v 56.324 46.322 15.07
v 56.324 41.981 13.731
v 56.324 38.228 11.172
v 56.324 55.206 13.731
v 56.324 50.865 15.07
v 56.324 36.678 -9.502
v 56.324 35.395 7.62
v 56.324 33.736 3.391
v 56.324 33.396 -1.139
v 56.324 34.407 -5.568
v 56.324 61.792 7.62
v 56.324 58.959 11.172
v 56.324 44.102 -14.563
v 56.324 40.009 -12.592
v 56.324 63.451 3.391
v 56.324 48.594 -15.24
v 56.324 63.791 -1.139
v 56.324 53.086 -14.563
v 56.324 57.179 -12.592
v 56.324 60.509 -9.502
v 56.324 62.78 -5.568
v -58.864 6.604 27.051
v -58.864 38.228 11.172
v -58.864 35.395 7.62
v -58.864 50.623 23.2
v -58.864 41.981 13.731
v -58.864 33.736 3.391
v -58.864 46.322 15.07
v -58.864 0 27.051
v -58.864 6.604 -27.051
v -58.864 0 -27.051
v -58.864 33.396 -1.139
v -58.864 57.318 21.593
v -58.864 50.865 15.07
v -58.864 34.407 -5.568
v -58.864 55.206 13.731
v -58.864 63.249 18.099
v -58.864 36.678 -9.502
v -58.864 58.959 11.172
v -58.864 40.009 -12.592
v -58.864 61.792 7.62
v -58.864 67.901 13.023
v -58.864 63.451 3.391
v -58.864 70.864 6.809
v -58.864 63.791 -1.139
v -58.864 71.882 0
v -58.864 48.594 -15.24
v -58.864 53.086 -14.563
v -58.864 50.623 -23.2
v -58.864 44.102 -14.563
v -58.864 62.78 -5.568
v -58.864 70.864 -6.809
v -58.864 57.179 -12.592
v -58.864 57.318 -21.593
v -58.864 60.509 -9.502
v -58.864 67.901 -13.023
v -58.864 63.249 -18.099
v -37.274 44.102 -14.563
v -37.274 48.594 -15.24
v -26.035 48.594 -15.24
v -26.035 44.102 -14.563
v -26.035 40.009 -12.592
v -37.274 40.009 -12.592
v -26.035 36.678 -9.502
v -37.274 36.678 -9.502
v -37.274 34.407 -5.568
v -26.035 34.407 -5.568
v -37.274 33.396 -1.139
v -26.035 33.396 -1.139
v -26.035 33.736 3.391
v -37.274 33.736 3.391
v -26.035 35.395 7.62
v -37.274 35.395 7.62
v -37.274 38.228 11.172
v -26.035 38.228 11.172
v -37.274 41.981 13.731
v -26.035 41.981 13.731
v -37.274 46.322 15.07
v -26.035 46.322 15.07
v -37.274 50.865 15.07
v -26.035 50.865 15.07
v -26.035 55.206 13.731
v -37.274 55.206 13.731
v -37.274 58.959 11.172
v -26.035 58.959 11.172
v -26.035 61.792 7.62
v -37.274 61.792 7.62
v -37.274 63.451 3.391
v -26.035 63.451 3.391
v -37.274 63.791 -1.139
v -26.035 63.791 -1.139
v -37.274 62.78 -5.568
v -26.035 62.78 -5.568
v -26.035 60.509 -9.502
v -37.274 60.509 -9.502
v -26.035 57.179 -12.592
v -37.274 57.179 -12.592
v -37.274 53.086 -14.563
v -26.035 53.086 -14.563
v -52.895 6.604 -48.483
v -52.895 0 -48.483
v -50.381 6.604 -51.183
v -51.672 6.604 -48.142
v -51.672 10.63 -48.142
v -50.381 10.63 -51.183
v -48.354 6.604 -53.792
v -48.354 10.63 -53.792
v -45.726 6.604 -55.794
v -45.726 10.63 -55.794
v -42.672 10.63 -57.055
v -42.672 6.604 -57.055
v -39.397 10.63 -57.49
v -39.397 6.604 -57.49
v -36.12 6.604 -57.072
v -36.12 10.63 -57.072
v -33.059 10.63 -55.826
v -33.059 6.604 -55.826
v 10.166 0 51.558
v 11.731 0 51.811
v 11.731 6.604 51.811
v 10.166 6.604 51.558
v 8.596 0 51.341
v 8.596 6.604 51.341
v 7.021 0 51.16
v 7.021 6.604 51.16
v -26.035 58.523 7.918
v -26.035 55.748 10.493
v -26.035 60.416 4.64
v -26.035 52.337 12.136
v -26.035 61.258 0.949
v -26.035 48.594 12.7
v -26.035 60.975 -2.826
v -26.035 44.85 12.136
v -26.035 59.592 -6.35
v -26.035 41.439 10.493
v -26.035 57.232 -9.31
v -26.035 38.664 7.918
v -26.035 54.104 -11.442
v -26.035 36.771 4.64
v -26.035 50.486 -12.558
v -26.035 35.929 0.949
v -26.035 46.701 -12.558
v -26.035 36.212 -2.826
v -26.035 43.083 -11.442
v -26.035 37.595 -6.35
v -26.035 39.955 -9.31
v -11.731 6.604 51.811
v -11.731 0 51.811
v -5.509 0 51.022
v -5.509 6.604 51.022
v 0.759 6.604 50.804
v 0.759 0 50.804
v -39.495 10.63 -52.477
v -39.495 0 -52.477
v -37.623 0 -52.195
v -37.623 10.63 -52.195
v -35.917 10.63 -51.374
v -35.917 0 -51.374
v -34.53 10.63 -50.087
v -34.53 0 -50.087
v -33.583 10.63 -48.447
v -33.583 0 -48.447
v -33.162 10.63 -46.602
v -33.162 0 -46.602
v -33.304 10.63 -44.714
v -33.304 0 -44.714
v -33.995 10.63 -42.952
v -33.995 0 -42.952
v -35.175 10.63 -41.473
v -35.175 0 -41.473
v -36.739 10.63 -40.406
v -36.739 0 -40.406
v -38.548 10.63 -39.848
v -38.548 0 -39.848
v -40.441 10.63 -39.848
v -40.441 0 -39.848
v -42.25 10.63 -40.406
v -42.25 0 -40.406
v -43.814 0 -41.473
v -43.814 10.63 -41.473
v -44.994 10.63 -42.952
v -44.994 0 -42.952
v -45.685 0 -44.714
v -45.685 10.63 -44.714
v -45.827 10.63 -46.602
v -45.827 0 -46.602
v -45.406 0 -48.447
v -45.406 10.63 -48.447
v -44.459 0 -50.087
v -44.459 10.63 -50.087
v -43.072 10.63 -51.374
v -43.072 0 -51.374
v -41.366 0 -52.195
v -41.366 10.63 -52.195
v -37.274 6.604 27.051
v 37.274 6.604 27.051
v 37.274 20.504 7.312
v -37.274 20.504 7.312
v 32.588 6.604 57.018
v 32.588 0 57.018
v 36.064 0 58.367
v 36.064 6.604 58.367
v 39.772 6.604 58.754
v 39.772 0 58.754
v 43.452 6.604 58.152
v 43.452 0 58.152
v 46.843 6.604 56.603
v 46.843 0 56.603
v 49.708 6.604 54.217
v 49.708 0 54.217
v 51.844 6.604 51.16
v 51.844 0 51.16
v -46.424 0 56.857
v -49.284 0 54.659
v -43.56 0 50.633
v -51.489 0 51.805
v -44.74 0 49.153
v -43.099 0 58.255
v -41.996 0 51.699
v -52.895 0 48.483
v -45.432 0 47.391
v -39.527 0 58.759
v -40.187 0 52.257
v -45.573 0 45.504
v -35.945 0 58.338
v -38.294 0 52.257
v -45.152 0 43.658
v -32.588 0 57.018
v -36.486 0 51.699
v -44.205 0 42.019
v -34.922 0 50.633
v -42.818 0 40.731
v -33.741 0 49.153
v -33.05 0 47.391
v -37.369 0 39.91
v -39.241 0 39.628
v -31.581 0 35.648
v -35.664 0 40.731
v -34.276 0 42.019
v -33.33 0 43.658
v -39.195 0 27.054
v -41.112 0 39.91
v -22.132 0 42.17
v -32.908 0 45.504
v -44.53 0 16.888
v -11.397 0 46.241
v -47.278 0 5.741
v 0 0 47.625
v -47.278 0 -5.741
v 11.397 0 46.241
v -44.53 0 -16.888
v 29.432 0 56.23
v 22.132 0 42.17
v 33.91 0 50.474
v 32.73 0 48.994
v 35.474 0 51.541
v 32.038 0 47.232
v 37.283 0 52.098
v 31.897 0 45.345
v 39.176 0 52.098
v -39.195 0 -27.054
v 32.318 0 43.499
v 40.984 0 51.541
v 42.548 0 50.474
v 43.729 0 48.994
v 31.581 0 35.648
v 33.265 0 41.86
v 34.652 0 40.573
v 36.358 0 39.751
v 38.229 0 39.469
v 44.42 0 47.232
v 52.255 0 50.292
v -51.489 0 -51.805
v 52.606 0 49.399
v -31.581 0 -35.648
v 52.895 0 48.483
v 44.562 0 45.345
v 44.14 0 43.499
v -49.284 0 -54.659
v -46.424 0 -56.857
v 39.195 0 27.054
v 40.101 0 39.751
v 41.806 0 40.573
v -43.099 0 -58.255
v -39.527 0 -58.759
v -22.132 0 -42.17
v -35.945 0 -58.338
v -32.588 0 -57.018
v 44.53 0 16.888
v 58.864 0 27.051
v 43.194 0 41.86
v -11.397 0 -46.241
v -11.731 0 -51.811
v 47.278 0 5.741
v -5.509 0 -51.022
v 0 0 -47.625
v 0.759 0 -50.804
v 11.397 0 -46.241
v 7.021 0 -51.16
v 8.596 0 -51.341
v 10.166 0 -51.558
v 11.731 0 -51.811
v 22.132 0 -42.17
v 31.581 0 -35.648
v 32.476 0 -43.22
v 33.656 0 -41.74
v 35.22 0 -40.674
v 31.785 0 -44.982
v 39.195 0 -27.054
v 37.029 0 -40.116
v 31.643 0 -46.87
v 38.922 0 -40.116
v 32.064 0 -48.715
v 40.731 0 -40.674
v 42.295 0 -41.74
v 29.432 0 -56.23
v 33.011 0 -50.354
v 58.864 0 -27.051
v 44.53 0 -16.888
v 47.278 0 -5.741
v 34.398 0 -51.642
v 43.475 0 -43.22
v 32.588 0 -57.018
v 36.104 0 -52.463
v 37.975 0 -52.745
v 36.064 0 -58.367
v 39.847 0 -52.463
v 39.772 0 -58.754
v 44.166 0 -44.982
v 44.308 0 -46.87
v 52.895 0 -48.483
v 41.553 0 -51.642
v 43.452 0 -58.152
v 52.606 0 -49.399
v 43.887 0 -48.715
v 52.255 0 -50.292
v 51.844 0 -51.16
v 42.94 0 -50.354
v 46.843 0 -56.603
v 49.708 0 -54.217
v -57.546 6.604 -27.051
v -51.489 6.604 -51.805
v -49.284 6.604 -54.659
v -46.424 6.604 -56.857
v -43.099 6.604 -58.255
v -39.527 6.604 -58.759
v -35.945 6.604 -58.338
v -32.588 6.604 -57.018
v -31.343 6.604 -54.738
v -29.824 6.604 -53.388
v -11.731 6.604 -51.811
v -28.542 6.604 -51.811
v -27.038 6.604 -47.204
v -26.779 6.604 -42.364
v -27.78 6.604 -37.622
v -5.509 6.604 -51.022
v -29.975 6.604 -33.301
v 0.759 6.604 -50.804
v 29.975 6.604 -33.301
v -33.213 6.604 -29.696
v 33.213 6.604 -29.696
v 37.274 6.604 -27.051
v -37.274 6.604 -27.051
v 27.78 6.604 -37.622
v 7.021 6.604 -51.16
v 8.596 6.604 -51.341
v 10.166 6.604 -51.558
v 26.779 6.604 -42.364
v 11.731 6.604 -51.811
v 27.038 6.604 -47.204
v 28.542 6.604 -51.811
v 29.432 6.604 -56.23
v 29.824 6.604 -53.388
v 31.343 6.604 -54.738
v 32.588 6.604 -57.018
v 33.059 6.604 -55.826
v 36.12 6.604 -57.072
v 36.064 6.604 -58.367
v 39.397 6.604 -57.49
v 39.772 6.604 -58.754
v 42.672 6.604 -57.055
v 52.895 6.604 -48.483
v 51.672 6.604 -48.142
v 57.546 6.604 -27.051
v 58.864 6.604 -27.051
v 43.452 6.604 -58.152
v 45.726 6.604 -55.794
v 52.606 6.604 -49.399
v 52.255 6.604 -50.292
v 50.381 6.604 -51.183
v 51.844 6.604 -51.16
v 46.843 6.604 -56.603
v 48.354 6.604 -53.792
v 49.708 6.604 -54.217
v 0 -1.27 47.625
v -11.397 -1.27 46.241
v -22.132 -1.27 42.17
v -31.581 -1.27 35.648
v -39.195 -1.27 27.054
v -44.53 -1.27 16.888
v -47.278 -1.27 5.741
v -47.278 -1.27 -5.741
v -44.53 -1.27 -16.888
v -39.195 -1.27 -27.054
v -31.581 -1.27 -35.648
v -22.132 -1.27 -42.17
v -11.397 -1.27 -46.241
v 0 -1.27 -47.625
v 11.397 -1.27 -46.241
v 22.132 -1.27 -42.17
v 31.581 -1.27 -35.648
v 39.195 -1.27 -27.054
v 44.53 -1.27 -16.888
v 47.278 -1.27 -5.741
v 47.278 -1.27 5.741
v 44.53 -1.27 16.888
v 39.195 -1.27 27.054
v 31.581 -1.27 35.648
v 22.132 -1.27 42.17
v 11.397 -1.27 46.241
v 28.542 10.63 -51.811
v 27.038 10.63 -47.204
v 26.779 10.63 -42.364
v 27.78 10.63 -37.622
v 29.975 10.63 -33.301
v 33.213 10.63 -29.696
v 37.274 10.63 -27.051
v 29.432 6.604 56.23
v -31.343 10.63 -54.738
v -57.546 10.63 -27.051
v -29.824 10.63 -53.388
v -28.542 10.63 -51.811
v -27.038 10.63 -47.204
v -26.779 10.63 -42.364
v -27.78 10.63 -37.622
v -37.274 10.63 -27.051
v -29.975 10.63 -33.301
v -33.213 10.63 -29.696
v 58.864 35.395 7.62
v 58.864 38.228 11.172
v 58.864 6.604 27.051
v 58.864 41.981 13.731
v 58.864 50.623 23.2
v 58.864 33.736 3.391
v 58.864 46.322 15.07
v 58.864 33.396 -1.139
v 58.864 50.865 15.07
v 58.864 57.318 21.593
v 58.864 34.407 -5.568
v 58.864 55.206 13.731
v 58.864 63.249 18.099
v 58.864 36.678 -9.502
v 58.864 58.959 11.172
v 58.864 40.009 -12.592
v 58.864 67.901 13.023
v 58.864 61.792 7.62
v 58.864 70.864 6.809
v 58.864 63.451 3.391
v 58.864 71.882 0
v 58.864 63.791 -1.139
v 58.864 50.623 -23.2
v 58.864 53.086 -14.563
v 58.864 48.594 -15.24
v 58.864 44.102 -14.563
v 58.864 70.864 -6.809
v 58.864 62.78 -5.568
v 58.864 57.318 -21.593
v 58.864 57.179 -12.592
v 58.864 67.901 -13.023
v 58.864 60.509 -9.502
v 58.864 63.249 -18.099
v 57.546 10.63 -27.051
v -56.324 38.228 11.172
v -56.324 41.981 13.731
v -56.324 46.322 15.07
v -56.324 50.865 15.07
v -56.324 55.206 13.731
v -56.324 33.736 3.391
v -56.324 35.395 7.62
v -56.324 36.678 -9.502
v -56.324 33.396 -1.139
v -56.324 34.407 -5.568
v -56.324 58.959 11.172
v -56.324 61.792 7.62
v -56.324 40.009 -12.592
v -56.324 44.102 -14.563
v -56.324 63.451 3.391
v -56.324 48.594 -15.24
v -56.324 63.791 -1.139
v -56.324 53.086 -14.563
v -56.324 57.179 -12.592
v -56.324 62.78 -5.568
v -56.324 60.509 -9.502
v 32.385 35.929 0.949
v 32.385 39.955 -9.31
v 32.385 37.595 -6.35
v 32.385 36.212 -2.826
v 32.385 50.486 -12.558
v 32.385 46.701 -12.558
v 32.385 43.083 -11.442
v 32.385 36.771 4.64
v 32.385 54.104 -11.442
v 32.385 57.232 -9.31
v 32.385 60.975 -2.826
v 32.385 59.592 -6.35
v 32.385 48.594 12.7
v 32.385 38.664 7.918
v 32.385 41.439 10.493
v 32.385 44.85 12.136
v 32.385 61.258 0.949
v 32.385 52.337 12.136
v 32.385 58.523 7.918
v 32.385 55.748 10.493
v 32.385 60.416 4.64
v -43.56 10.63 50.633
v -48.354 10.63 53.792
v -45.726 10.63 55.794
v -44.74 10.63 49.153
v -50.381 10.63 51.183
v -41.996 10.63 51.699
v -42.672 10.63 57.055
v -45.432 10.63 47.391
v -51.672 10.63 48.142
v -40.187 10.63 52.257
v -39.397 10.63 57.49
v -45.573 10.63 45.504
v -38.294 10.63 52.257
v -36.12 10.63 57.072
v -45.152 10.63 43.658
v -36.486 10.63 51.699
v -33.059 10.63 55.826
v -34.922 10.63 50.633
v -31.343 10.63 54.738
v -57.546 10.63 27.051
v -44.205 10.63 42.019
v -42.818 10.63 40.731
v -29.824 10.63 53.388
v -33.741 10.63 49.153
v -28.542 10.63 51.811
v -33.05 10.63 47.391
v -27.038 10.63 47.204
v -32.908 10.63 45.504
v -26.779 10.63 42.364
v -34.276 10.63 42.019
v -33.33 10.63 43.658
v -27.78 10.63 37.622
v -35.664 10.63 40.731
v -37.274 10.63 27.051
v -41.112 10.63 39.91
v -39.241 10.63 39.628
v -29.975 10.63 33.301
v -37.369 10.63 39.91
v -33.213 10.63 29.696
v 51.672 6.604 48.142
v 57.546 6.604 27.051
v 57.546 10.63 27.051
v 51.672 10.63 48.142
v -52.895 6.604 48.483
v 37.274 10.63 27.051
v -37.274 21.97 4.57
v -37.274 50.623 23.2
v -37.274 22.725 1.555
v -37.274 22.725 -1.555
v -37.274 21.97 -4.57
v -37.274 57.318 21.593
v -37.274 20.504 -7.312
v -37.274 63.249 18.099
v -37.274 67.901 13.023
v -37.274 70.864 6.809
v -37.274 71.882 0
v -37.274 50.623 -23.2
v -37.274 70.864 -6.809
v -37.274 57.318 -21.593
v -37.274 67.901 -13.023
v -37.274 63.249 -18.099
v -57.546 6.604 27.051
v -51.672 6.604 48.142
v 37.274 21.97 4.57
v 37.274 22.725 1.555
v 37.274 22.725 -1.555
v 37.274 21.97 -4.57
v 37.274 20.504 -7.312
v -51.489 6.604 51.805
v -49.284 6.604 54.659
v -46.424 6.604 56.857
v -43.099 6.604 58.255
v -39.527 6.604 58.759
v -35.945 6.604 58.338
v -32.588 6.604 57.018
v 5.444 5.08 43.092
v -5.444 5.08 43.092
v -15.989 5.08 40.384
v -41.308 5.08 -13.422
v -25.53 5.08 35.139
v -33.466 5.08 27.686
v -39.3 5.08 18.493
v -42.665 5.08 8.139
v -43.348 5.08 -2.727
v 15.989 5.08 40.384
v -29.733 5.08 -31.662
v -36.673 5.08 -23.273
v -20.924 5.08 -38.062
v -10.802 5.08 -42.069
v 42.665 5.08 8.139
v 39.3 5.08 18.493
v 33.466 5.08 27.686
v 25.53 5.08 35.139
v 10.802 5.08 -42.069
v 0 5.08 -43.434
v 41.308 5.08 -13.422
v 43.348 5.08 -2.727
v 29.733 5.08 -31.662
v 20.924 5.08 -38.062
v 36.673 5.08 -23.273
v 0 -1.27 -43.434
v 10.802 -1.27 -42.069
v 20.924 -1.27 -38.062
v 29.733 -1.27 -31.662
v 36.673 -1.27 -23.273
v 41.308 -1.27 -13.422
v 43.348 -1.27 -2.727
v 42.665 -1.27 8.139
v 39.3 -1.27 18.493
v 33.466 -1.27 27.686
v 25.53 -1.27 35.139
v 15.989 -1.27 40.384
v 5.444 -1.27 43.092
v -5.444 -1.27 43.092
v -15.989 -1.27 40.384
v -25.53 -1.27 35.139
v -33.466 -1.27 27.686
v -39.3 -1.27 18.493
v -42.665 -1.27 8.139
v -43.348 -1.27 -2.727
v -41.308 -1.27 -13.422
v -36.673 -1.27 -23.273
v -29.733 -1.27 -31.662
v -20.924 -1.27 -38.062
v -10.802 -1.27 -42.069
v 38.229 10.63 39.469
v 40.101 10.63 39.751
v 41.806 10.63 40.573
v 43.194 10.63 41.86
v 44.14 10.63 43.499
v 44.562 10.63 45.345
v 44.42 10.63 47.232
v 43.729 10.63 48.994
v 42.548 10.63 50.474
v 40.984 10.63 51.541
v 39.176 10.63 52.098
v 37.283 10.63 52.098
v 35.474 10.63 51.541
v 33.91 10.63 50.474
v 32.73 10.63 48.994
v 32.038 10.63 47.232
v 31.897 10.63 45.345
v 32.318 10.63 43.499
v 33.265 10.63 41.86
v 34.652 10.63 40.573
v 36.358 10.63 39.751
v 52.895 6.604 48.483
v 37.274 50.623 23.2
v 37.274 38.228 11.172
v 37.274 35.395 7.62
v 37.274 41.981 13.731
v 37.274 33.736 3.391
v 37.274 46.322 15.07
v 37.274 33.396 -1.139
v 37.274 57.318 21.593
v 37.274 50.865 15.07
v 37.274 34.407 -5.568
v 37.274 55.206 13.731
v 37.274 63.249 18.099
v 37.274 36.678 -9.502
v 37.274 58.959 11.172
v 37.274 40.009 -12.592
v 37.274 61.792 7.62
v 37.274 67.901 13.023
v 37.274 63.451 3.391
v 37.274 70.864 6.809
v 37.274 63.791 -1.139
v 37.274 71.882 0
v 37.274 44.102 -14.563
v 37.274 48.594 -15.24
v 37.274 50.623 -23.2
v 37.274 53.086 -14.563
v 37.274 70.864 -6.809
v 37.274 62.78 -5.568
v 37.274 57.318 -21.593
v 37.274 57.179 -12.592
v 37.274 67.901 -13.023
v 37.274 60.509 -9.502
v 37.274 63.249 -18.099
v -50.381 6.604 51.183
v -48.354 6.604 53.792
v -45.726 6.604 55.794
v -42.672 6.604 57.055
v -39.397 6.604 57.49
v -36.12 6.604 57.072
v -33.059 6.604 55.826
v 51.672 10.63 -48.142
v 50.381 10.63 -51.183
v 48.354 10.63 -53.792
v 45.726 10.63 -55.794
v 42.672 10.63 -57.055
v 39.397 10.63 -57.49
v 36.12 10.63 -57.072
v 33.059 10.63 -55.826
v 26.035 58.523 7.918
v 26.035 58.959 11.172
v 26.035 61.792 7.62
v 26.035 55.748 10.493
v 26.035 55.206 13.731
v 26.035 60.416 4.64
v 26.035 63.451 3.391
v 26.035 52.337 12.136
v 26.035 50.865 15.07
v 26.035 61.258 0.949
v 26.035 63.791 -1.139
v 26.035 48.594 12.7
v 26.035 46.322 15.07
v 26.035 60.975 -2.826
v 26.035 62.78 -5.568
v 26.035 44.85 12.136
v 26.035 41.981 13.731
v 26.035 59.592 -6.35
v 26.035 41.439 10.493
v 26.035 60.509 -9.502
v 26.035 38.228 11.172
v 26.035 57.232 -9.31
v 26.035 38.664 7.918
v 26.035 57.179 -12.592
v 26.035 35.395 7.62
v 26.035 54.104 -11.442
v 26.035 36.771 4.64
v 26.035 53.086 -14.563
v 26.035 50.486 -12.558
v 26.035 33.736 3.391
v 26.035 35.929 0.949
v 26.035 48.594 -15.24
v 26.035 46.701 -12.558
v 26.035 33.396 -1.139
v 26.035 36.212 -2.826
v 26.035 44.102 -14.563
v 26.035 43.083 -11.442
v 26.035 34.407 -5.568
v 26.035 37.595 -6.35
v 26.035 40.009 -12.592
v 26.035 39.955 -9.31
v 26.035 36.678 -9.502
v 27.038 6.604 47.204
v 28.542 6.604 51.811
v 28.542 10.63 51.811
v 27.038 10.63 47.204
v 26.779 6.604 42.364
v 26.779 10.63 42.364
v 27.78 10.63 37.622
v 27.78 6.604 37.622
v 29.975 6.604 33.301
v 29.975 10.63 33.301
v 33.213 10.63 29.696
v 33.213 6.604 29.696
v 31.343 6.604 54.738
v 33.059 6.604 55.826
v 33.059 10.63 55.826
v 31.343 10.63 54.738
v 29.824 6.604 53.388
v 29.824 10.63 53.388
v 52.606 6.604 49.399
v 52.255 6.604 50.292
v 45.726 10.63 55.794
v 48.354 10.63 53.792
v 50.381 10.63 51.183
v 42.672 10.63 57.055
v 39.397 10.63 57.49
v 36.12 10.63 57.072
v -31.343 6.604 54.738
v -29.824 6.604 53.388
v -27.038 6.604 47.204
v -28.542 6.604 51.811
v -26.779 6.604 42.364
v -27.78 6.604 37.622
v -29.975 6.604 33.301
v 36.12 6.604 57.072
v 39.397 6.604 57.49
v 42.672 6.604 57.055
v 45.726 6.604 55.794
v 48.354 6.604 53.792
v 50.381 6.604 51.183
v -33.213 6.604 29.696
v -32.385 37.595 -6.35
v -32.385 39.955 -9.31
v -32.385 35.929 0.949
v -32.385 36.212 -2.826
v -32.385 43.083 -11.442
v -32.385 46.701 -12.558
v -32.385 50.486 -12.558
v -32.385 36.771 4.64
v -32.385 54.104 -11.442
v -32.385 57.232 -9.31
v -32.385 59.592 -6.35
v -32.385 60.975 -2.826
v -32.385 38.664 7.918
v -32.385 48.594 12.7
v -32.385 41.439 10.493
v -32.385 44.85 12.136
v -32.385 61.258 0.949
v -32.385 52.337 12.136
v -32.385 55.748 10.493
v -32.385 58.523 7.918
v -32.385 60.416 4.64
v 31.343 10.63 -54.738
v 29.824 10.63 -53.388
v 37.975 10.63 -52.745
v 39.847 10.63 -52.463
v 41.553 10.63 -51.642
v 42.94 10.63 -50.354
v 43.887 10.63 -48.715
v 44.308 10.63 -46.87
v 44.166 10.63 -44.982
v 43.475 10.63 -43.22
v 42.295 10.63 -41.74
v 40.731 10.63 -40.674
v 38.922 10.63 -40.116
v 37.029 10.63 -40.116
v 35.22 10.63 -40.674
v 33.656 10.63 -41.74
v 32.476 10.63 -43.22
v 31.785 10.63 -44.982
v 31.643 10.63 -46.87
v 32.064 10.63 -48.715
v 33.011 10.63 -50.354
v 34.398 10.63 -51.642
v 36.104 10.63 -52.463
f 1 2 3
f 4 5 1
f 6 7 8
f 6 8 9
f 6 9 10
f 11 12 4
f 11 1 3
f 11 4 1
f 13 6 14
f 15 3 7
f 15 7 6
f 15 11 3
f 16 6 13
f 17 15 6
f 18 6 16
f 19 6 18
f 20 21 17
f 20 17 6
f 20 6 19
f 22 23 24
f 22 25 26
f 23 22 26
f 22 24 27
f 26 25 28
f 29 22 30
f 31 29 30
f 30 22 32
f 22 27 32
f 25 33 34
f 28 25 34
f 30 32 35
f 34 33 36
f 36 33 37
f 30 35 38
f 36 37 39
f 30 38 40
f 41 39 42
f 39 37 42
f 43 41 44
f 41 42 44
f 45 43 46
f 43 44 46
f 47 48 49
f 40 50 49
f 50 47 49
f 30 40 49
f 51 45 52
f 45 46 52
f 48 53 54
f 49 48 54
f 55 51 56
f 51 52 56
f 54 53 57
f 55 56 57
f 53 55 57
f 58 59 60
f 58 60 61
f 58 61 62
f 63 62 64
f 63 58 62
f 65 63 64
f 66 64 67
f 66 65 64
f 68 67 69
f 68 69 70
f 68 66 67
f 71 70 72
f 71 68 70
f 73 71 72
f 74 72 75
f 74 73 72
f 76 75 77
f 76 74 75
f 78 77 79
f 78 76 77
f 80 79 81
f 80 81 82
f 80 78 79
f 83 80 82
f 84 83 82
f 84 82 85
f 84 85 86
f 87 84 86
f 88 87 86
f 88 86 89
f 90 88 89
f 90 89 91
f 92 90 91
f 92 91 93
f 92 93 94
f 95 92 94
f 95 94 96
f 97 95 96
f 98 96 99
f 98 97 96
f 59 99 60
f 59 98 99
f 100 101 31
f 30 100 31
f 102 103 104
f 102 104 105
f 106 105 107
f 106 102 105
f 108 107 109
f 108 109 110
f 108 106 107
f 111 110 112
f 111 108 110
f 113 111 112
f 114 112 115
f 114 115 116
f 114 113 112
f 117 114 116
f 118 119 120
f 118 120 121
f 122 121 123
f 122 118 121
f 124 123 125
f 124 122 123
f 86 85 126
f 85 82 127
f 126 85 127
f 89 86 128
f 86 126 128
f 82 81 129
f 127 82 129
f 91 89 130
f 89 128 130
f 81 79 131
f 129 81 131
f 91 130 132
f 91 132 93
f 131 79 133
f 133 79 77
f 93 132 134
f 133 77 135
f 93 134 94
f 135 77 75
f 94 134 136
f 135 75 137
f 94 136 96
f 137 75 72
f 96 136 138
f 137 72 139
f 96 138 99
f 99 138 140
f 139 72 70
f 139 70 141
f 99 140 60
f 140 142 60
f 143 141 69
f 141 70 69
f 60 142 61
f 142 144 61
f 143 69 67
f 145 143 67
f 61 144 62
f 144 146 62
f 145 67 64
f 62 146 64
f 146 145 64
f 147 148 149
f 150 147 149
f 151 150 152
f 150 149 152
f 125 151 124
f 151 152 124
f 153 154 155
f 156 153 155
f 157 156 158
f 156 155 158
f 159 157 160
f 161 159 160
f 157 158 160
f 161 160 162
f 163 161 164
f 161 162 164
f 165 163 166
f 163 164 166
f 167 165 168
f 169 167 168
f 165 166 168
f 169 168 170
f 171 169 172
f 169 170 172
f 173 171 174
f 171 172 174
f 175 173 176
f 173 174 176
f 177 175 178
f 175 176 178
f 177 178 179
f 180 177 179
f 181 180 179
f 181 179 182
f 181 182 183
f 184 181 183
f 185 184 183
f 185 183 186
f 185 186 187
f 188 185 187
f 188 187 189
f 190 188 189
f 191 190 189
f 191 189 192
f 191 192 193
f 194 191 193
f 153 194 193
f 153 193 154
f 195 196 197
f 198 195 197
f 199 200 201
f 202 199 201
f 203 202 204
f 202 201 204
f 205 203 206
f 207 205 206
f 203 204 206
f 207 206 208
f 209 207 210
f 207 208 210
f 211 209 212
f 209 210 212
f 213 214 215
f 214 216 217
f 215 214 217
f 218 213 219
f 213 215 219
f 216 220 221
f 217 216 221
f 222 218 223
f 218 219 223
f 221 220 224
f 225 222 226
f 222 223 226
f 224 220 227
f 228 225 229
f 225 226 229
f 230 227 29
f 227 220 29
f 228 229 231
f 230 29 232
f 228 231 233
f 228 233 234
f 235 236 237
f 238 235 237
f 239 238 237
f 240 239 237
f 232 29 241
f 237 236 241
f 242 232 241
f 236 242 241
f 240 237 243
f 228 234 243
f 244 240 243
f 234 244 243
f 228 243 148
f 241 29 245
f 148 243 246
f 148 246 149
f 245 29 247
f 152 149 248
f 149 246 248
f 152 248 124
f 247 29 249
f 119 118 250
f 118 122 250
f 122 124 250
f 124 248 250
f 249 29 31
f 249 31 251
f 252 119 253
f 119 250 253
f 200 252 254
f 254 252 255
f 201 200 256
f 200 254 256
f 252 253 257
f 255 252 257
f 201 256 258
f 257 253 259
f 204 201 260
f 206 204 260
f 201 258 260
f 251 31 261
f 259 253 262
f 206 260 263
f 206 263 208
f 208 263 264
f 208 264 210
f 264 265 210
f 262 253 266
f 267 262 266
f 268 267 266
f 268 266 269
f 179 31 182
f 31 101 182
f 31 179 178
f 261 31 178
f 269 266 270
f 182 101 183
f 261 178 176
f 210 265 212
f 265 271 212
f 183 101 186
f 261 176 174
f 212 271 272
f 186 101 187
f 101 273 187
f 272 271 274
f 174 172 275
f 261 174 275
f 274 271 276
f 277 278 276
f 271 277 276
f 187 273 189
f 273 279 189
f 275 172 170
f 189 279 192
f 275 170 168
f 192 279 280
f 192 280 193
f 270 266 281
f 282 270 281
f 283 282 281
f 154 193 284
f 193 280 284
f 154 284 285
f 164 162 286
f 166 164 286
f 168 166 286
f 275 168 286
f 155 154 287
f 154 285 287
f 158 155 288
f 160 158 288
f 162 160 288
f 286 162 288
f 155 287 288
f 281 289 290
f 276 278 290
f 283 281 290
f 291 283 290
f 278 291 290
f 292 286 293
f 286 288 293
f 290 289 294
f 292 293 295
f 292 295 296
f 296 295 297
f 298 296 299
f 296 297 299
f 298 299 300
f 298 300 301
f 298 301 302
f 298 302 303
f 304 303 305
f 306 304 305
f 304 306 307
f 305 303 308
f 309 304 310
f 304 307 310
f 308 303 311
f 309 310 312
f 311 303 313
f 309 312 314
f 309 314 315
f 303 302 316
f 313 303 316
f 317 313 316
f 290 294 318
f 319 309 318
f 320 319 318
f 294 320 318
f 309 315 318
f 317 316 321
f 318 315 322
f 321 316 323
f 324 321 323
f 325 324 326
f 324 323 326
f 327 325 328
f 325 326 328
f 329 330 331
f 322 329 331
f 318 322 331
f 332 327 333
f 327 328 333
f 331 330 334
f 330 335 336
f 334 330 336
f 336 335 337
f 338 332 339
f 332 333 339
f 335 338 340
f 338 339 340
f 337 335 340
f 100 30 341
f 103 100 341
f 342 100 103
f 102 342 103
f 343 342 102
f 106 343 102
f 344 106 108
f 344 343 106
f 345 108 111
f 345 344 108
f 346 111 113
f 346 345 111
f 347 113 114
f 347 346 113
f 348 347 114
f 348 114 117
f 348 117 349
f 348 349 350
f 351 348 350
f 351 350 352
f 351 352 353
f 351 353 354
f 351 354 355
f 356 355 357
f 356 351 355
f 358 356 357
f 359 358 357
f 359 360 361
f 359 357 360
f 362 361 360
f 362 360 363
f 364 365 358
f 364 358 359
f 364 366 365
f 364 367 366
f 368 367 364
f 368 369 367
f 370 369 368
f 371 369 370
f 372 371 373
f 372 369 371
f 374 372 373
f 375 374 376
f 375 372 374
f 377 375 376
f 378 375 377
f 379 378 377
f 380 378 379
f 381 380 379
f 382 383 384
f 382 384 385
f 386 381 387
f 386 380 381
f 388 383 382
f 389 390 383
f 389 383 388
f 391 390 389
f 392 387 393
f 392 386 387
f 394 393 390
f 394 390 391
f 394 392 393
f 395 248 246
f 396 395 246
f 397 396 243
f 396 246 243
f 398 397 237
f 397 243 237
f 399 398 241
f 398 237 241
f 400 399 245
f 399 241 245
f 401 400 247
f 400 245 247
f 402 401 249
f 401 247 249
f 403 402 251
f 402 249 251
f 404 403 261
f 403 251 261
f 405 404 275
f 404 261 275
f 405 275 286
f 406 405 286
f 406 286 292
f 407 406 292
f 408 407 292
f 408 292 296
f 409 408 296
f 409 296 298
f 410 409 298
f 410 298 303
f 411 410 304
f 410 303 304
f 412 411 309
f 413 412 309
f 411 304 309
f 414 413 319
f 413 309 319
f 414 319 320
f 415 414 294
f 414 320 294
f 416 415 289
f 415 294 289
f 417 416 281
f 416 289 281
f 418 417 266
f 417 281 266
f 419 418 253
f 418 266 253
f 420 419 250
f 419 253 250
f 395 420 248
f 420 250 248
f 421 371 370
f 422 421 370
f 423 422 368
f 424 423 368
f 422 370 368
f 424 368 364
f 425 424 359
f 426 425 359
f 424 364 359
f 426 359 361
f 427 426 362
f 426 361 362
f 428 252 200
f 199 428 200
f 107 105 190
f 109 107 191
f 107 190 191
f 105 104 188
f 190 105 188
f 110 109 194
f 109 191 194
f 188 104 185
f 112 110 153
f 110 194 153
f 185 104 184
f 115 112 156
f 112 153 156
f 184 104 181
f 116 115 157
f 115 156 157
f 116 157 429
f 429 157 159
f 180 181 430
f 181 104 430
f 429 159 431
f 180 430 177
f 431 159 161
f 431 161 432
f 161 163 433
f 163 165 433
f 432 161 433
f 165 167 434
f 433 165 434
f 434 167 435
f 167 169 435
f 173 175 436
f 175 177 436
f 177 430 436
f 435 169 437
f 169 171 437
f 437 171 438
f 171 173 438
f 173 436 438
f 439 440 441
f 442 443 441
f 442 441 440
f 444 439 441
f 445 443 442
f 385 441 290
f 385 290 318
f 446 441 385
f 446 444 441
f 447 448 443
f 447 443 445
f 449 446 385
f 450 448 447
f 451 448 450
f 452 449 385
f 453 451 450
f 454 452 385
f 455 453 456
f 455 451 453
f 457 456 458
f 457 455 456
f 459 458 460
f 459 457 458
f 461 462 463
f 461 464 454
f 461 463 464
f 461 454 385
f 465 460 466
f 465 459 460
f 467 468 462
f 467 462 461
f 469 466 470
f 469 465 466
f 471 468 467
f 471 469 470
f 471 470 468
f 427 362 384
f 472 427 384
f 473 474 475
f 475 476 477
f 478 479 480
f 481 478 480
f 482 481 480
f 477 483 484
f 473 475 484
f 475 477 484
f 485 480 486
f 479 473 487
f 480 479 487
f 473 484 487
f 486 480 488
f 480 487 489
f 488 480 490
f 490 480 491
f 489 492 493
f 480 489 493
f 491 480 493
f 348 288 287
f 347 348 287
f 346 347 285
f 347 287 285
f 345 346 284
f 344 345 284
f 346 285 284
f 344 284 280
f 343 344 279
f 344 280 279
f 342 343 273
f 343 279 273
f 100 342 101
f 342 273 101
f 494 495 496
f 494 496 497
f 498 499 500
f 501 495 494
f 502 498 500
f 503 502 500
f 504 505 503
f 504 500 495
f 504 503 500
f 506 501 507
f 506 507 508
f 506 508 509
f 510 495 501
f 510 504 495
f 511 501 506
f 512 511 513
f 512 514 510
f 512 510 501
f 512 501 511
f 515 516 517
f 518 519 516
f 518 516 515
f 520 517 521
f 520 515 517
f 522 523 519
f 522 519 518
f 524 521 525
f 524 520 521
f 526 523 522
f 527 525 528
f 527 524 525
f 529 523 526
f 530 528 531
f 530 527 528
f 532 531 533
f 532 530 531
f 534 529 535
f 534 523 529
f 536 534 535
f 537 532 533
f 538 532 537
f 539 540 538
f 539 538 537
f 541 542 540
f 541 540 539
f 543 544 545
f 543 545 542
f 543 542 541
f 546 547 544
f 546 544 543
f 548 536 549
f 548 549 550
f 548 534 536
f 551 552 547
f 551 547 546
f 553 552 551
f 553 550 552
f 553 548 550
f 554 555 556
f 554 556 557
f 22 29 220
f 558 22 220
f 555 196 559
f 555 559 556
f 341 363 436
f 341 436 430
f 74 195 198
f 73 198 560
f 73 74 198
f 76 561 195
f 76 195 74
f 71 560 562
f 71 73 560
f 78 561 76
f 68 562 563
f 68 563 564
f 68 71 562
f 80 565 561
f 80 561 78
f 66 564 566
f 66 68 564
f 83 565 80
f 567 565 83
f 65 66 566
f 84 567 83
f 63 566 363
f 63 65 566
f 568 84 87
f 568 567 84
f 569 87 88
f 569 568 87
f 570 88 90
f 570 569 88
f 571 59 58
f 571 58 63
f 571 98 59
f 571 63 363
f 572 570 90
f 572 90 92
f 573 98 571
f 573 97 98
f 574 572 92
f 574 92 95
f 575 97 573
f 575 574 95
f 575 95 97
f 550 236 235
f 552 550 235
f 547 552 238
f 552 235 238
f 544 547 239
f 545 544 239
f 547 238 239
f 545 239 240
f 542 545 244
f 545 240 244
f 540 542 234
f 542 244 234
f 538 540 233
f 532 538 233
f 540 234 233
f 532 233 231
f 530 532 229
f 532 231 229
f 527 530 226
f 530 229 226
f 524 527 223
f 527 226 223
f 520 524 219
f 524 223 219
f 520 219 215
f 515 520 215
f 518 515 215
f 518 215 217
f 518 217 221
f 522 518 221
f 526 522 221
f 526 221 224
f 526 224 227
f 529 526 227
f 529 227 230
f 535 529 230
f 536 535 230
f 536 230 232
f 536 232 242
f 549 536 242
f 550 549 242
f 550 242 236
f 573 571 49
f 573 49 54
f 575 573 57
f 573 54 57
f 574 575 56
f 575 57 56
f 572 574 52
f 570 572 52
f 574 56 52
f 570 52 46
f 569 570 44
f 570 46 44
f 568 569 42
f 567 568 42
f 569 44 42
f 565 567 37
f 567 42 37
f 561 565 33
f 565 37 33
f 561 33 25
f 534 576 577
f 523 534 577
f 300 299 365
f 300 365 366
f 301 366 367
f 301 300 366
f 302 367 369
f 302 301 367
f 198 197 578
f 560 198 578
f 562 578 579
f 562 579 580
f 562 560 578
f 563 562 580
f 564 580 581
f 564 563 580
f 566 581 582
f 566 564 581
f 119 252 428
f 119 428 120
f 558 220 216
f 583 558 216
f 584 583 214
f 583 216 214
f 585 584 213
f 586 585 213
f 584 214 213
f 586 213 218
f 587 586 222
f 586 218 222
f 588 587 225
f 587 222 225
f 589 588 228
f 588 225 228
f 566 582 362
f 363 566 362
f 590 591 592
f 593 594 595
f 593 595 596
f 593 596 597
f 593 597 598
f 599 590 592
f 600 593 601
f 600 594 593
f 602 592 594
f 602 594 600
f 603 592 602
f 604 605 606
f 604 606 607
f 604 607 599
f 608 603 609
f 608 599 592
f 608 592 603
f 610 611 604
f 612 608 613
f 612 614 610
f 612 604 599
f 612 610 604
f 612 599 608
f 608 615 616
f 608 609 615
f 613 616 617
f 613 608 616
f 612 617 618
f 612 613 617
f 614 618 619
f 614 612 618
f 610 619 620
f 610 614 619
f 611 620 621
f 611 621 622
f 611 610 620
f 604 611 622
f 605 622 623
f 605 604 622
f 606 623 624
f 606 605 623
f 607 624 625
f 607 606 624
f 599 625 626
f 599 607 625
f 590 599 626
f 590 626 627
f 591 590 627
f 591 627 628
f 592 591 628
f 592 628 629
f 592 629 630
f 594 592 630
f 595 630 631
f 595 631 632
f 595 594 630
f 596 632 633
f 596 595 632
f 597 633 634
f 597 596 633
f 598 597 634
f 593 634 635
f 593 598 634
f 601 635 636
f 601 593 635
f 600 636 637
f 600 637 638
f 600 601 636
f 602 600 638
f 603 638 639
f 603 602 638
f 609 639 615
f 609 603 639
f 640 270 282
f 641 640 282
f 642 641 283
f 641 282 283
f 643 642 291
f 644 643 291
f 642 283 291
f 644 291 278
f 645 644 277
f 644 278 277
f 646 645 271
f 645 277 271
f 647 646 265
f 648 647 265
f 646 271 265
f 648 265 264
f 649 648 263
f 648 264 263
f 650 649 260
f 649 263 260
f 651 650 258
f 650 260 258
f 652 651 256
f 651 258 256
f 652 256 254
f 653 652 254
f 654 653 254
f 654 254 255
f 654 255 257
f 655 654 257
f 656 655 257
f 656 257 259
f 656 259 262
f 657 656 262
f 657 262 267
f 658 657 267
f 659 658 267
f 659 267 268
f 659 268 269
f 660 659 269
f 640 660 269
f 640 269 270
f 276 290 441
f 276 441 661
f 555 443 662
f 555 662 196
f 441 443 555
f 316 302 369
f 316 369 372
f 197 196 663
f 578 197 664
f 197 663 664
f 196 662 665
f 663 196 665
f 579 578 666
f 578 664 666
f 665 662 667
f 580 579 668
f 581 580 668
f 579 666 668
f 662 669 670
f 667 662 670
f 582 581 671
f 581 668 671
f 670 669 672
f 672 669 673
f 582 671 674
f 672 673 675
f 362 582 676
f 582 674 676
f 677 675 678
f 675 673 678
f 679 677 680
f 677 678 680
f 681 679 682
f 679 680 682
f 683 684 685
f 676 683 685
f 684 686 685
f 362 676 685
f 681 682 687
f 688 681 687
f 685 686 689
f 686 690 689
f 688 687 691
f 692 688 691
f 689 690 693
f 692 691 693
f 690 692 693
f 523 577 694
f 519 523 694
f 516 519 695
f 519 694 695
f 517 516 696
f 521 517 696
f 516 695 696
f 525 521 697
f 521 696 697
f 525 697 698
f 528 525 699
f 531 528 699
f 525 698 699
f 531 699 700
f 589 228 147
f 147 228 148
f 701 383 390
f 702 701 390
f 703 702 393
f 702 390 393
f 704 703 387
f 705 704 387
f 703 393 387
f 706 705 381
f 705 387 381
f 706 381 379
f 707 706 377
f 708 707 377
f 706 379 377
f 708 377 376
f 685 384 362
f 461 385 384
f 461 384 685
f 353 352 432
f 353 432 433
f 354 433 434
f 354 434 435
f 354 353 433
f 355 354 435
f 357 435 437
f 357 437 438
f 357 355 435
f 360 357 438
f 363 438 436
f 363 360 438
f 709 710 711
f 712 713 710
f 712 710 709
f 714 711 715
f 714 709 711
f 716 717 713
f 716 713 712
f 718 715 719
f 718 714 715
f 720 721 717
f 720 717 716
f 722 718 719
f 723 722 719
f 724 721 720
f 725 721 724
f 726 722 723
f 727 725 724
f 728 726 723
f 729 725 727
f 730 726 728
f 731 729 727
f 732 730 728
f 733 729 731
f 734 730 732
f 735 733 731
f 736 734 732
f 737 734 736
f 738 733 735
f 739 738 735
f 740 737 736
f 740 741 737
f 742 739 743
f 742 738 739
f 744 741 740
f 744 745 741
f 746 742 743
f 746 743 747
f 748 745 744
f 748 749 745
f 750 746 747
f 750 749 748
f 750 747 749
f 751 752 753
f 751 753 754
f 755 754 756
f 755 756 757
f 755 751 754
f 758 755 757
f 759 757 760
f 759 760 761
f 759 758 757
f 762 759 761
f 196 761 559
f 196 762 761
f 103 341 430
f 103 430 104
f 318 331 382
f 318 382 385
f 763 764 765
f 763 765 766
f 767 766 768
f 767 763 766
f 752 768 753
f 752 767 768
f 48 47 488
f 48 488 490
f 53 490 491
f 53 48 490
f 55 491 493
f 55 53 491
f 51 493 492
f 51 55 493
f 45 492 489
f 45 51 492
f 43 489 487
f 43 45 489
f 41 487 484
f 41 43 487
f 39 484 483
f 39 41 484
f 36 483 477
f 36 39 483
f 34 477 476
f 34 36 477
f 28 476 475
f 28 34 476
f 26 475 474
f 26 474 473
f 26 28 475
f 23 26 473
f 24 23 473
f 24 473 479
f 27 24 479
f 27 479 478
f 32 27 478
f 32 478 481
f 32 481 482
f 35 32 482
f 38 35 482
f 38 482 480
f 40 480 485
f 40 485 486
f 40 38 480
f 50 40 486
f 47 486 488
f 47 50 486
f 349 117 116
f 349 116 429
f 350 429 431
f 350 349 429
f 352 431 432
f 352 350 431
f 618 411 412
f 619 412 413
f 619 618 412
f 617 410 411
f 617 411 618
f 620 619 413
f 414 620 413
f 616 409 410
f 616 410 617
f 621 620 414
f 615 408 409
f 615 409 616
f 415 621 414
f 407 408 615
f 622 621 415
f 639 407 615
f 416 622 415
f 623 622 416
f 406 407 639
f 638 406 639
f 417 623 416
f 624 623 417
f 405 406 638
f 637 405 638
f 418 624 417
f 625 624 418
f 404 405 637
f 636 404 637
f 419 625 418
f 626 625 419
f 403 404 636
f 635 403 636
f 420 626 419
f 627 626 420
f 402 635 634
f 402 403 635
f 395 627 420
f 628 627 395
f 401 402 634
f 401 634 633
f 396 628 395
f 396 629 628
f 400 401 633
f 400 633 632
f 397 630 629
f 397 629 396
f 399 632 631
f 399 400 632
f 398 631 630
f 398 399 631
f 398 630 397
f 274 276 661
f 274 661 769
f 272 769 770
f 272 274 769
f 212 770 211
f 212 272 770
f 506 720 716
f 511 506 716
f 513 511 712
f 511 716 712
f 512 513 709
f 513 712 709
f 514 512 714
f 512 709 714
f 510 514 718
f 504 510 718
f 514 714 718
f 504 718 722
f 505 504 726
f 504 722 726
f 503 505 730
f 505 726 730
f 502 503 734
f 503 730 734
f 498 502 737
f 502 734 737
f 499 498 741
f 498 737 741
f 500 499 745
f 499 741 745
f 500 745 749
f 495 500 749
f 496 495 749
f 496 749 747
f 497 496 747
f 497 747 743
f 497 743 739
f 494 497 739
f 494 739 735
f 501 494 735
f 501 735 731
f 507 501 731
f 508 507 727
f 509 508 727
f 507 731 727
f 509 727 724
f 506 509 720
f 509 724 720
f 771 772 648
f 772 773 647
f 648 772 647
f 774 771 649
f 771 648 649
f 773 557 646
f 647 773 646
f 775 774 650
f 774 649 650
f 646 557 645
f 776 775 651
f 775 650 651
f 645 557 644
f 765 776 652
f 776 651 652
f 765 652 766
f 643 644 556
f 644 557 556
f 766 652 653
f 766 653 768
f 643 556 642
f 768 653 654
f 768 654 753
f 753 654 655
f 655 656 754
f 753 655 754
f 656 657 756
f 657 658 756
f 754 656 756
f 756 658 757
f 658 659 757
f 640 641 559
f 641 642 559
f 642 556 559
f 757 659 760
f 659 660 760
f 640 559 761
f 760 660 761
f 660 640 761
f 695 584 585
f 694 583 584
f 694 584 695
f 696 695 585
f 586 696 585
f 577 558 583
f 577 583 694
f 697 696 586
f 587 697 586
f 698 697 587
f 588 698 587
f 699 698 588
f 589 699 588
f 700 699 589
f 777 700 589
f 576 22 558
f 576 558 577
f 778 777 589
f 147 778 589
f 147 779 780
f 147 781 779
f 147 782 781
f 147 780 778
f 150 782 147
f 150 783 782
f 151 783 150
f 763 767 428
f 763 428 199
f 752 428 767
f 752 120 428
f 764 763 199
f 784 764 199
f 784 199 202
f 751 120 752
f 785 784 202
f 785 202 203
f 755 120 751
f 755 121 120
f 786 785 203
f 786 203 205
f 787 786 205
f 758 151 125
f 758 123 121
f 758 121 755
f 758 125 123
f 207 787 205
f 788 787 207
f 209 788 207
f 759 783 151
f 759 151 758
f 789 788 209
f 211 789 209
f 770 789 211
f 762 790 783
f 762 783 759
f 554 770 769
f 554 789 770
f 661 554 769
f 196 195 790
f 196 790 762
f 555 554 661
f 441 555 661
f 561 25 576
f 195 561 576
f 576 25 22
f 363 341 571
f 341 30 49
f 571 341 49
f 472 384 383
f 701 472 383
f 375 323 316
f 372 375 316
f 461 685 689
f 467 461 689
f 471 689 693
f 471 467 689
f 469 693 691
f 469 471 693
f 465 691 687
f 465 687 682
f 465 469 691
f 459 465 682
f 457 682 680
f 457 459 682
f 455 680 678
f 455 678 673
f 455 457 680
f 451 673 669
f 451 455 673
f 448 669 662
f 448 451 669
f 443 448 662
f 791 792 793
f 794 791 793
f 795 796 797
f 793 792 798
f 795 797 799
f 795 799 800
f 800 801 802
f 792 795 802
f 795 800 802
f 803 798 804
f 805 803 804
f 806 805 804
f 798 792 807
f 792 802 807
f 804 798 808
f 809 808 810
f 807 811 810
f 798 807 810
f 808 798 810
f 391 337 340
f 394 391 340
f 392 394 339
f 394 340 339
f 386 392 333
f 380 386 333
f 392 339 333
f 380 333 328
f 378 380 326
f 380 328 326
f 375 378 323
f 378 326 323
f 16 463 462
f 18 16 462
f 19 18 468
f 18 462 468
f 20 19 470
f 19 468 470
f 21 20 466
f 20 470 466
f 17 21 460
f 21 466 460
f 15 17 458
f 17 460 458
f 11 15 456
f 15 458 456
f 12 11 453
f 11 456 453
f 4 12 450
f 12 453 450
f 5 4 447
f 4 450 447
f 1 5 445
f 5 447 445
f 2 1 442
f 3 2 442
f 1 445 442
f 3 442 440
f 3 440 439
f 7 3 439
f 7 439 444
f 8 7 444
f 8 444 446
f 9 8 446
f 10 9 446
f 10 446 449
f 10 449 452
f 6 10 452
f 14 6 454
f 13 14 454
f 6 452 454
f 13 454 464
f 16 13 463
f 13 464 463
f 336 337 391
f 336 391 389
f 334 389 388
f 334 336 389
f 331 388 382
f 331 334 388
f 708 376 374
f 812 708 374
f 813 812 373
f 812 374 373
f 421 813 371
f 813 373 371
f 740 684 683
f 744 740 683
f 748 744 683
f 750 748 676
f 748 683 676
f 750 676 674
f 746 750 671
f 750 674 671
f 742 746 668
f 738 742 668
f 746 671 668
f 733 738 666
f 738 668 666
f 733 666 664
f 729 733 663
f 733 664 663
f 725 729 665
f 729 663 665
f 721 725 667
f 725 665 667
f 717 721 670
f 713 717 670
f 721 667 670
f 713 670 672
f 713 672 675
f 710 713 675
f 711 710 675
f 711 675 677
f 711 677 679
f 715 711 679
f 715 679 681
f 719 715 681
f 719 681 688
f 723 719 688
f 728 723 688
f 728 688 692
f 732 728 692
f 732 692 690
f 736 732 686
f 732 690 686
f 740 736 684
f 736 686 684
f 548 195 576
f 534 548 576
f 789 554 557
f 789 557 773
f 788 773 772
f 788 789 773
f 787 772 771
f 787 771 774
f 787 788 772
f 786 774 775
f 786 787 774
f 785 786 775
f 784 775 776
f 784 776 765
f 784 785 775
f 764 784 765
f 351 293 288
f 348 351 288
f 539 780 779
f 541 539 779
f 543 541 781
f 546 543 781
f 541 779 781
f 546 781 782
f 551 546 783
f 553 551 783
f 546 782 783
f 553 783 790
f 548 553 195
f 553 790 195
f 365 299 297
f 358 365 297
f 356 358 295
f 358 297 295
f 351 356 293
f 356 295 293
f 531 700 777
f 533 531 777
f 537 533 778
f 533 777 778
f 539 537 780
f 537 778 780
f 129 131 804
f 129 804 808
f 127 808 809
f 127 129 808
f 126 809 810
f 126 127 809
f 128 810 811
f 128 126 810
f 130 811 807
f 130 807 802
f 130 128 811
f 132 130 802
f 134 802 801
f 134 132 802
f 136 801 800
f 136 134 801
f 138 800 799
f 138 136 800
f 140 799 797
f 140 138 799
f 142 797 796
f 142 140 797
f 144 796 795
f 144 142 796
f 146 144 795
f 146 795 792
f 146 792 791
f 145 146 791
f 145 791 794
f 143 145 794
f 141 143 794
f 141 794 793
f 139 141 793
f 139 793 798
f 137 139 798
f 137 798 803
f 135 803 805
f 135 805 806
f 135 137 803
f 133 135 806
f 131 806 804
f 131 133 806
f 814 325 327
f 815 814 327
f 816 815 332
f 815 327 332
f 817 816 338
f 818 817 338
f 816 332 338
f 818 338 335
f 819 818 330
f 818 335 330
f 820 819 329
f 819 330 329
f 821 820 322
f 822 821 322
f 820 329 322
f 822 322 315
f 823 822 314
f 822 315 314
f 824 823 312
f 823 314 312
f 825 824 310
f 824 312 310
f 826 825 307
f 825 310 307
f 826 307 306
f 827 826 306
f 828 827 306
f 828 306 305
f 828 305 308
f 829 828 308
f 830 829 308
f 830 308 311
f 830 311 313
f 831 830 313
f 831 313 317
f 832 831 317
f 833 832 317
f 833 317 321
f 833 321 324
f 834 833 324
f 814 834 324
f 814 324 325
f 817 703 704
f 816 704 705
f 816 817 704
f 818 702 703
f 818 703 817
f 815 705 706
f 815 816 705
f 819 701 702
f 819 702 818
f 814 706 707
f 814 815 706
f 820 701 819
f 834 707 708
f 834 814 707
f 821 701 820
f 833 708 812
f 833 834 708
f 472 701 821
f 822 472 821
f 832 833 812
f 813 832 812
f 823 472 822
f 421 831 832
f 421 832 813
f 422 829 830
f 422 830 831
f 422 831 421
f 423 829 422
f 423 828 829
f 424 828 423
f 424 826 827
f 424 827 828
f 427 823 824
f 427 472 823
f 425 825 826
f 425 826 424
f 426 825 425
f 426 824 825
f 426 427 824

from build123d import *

# Parameters (mm, degrees)
BOSS_EXTRUDE1_DEPTH  = 6.604
MOVE_FACE1_DEPTH     = 6.604
MOVE_FACE1_2_DEPTH   = 6.604
BOSS_EXTRUDE2_DEPTH  = 21.59
BOSS_EXTRUDE3_REACH  = 135.651
FILLET1_R            = 12.7
BOSS_EXTRUDE4_DEPTH  = 4.0259
MIRROR3_COPY_1_DEPTH = 4.0259
SKETCH13_R           = 6.35
CUT_EXTRUDE1_DEPTH   = 110.931012164
SKETCH9_R            = 47.625
SKETCH9_R_2          = 43.434
BOSS_EXTRUDE7_DEPTH  = 1.27
CUT_EXTRUDE2_START   = -5.08
SKETCH15_R           = 43.434
CUT_EXTRUDE2_DEPTH   = 5.08
SKETCH16_R           = 15.24
CUT_EXTRUDE3_DEPTH   = 2.54
SKETCH17_R           = 15.24
BOSS_EXTRUDE8_DEPTH  = 11.2395
SKETCH18_R           = 12.7
CUT_EXTRUDE4_DEPTH   = 6.35


# Read off the part's stored shape, not the designer's step: Move Face1
with BuildPart() as part:
    # Sketch1 → Boss-Extrude1 (new body)
    with BuildSketch(Plane(origin=(0, 0, 0), x_dir=(1, 0, 0), z_dir=(0, 1, 0))):
        with BuildLine():
            Line((0, 27.051), (0, -27.051))
            Line((0, -27.051), (5.969168013, -48.482817353))
            ThreePointArc((5.969168013, -48.482817353), (14.05820124, -57.663213719), (26.276846155, -57.017572631))
            Line((26.276846155, -57.017572631), (47.13309789, -51.810845761))
            ThreePointArc((47.13309789, -51.810845761), (58.8645, -50.8), (70.59590211, -51.810845761))
            Line((70.59590211, -51.810845761), (91.452153845, -57.017572631))
            ThreePointArc((91.452153845, -57.017572631), (103.67079876, -57.663213719), (111.759831987, -48.482817353))
            Line((111.759831987, -48.482817353), (117.729, -27.051))
            Line((117.729, -27.051), (117.729, 27.051))
            Line((117.729, 27.051), (111.759831987, 48.482817353))
            ThreePointArc((111.759831987, 48.482817353), (103.67079876, 57.663213719), (91.452153845, 57.017572631))
            Line((91.452153845, 57.017572631), (70.59590211, 51.810845761))
            ThreePointArc((70.59590211, 51.810845761), (58.8645, 50.8), (47.13309789, 51.810845761))
            Line((47.13309789, 51.810845761), (26.276846155, 57.017572631))
            ThreePointArc((26.276846155, 57.017572631), (14.05820124, 57.663213719), (5.969168013, 48.482817353))
            Line((5.969168013, 48.482817353), (0, 27.051))
        make_face()
    extrude(amount=BOSS_EXTRUDE1_DEPTH)

    # Move Face1 outline → Move Face1 (cut)
    with BuildSketch(Plane(origin=(0, 0, 0), x_dir=(1, 0, 0), z_dir=(0, 1, 0))):
        with BuildLine():
            ThreePointArc((11.73140211, -51.810845761), (9.381670874, -51.444731901), (7.020658859, -51.160305269))
            ThreePointArc((7.020658859, -51.160305269), (15.412744455, -58.152404227), (26.276846155, -57.017572631))
            Line((26.276846155, -57.017572631), (29.43225, -56.229831564))
            Line((29.43225, -56.229831564), (11.73140211, -51.810845761))
        make_face()
        with BuildLine():
            ThreePointArc((26.276846155, 57.017572631), (15.412744455, 58.152404227), (7.020658859, 51.160305269))
            ThreePointArc((7.020658859, 51.160305269), (9.381670874, 51.444731901), (11.73140211, 51.810845761))
            Line((11.73140211, 51.810845761), (29.43225, 56.229831564))
            Line((29.43225, 56.229831564), (26.276846155, 57.017572631))
        make_face()
        with BuildLine():
            ThreePointArc((52.895331987, -48.482817353), (52.438308346, -49.848549416), (51.843841141, -51.160305269))
            ThreePointArc((51.843841141, -51.160305269), (61.242225011, -50.841231235), (70.59590211, -51.810845761))
            Line((70.59590211, -51.810845761), (91.452153845, -57.017572631))
            ThreePointArc((91.452153845, -57.017572631), (103.67079876, -57.663213719), (111.759831987, -48.482817353))
            Line((111.759831987, -48.482817353), (117.729, -27.051))
            Line((117.729, -27.051), (117.729, 27.051))
            Line((117.729, 27.051), (111.759831987, 48.482817353))
            ThreePointArc((111.759831987, 48.482817353), (103.67079876, 57.663213719), (91.452153845, 57.017572631))
            Line((91.452153845, 57.017572631), (70.59590211, 51.810845761))
            ThreePointArc((70.59590211, 51.810845761), (61.242225011, 50.841231235), (51.843841141, 51.160305269))
            ThreePointArc((51.843841141, 51.160305269), (52.438308346, 49.848549416), (52.895331987, 48.482817353))
            Line((52.895331987, 48.482817353), (58.8645, 27.051))
            Line((58.8645, 27.051), (58.8645, -27.051))
            Line((58.8645, -27.051), (52.895331987, -48.482817353))
        make_face()
    extrude(amount=MOVE_FACE1_DEPTH, mode=Mode.SUBTRACT)

    # Move Face1 2 outline → Move Face1 2 (add)
    with BuildSketch(Plane(origin=(0, 0, 0), x_dir=(1, 0, 0), z_dir=(0, 1, 0))):
        with BuildLine():
            Line((-58.8645, -27.051), (-52.895331987, -48.482817353))
            ThreePointArc((-52.895331987, -48.482817353), (-44.80629876, -57.663213719), (-32.587653845, -57.017572631))
            Line((-32.587653845, -57.017572631), (-11.73140211, -51.810845761))
            ThreePointArc((-11.73140211, -51.810845761), (-2.377725011, -50.841231235), (7.020658859, -51.160305269))
            ThreePointArc((7.020658859, -51.160305269), (6.426191654, -49.848549416), (5.969168013, -48.482817353))
            Line((5.969168013, -48.482817353), (0, -27.051))
            Line((0, -27.051), (0, 27.051))
            Line((0, 27.051), (5.969168013, 48.482817353))
            ThreePointArc((5.969168013, 48.482817353), (6.426191654, 49.848549416), (7.020658859, 51.160305269))
            ThreePointArc((7.020658859, 51.160305269), (-2.377725011, 50.841231235), (-11.73140211, 51.810845761))
            Line((-11.73140211, 51.810845761), (-32.587653845, 57.017572631))
            ThreePointArc((-32.587653845, 57.017572631), (-44.80629876, 57.663213719), (-52.895331987, 48.482817353))
            Line((-52.895331987, 48.482817353), (-58.8645, 27.051))
            Line((-58.8645, 27.051), (-58.8645, -27.051))
        make_face()
        with BuildLine():
            Line((47.13309789, -51.810845761), (29.43225, -56.229831564))
            Line((29.43225, -56.229831564), (32.587653845, -57.017572631))
            ThreePointArc((32.587653845, -57.017572631), (43.451755545, -58.152404227), (51.843841141, -51.160305269))
            ThreePointArc((51.843841141, -51.160305269), (49.482829126, -51.444731901), (47.13309789, -51.810845761))
        make_face()
        with BuildLine():
            Line((32.587653845, 57.017572631), (29.43225, 56.229831564))
            Line((29.43225, 56.229831564), (47.13309789, 51.810845761))
            ThreePointArc((47.13309789, 51.810845761), (49.482829126, 51.444731901), (51.843841141, 51.160305269))
            ThreePointArc((51.843841141, 51.160305269), (43.451755545, 58.152404227), (32.587653845, 57.017572631))
        make_face()
    extrude(amount=MOVE_FACE1_2_DEPTH)

    # Sketch5 → Boss-Extrude2 (add)
    with BuildSketch(Plane(origin=(58.8645, 0, 0), x_dir=(0, 0, -1), z_dir=(1, 0, 0))):
        with BuildLine():
            Line((-23.199811166, 50.623289797), (-27.051, 6.604))
            Line((-27.051, 6.604), (27.051, 6.604))
            Line((27.051, 6.604), (23.199811166, 50.623289797))
            ThreePointArc((23.199811166, 50.623289797), (0, 71.882), (-23.199811166, 50.623289797))
        make_face()
    boss_extrude2 = extrude(amount=-BOSS_EXTRUDE2_DEPTH)

    # Mirror1: Boss-Extrude2 across plane
    add(boss_extrude2.mirror(Plane(origin=(0, 0, 0), x_dir=(0, 0, 1), z_dir=(1, 0, 0))))

    # Sketch7 → Boss-Extrude3 (add, up to next)
    with BuildSketch(Plane.ZY.offset(-37.2745), mode=Mode.PRIVATE) as boss_extrude3_sk1:
        Polygon((-27.051, 6.604), (27.051, 6.604), (0, 25.654), align=None)
    boss_extrude3_tool1 = extrude(boss_extrude3_sk1.sketch, amount=BOSS_EXTRUDE3_REACH, mode=Mode.PRIVATE) - part.part
    add(boss_extrude3_tool1.solids().sort_by_distance((37.2745, 12.954, 0))[0])

    # Fillet1
    fillet1_edges = [part.edges().sort_by_distance(p)[0] for p in [
        (0, 25.654, 0),
    ]]
    fillet(fillet1_edges, radius=FILLET1_R)

    # Sketch8 → Boss-Extrude4 (add)
    with BuildSketch(Plane(origin=(0, 6.604, 0), x_dir=(1, 0, 0), z_dir=(0, 1, 0))):
        with BuildLine():
            Line((-57.546161193, -27.051), (-51.671898381, -48.142067867))
            ThreePointArc((-51.671898381, -48.142067867), (-44.239742404, -56.523444134), (-33.059468887, -55.82638267))
            ThreePointArc((-33.059468887, -55.82638267), (-30.556113123, -54.093687416), (-28.541750469, -51.810845761))
            ThreePointArc((-28.541750469, -51.810845761), (-27.780193276, -37.622311234), (-37.2745, -27.051))
            Line((-37.2745, -27.051), (-57.546161193, -27.051))
        make_face()
    boss_extrude4 = extrude(amount=BOSS_EXTRUDE4_DEPTH)

    # Mirror2: Boss-Extrude4 across plane
    add(boss_extrude4.mirror(Plane(origin=(0, 0, 0), x_dir=(0, 0, 1), z_dir=(1, 0, 0))))

    # Mirror3: Boss-Extrude4 across plane
    add(boss_extrude4.mirror(Plane.XY))

    # Mirror3 copy 1 sketch → Mirror3 copy 1 (add)
    with BuildSketch(Plane(origin=(0, 6.604, 0), x_dir=(-1, 0, 0), z_dir=(0, 1, 0))):
        with BuildLine():
            Line((-57.546161193, -27.051), (-51.671898381, -48.142067867))
            ThreePointArc((-51.671898381, -48.142067867), (-44.239742404, -56.523444134), (-33.059468887, -55.82638267))
            ThreePointArc((-33.059468887, -55.82638267), (-30.556113123, -54.093687416), (-28.541750469, -51.810845761))
            ThreePointArc((-28.541750469, -51.810845761), (-27.780193276, -37.622311234), (-37.2745, -27.051))
            Line((-37.2745, -27.051), (-57.546161193, -27.051))
        make_face()
    extrude(amount=MIRROR3_COPY_1_DEPTH)

    # Sketch13 → Cut-Extrude1 (cut, through all)
    with BuildSketch(Plane(origin=(0, 0, 0), x_dir=(-1, 0, 0), z_dir=(0, -1, 0))):
        with Locations(Location((39.240708081, -45.97811401, 0), (0, 0, 90))):
            Circle(SKETCH13_R)
        with Locations(Location((-38.229291919, -45.81936236, 0), (0, 0, 90))):
            Circle(SKETCH13_R)
        with Locations(Location((-37.975496477, 46.39533764, 0), (0, 0, 90))):
            Circle(SKETCH13_R)
        with Locations(Location((39.494503523, 46.12740723, 0), (0, 0, 90))):
            Circle(SKETCH13_R)
    extrude(amount=-CUT_EXTRUDE1_DEPTH, mode=Mode.SUBTRACT)

    # Sketch9 → Boss-Extrude7 (add)
    with BuildSketch(Plane.XZ):
        with Locations(Location((0, 0, 0), (0, 0, 90))):
            Circle(SKETCH9_R)
        with Locations(Location((0, 0, 0), (0, 0, 270))):
            Circle(SKETCH9_R_2, mode=Mode.SUBTRACT)
    extrude(amount=BOSS_EXTRUDE7_DEPTH)

    # Sketch15 → Cut-Extrude2 (cut)
    with BuildSketch(Plane.XZ.offset(CUT_EXTRUDE2_START)):
        with Locations(Location((0, 0, 0), (0, 0, 270))):
            Circle(SKETCH15_R)
    extrude(amount=CUT_EXTRUDE2_DEPTH, mode=Mode.SUBTRACT)

    # Sketch16 → Cut-Extrude3 (cut)
    with BuildSketch(Plane(origin=(58.8645, 0, 0), x_dir=(0, 0, -1), z_dir=(1, 0, 0))):
        with Locations((0, 48.593569324)):
            Circle(SKETCH16_R)
    cut_extrude3 = extrude(amount=-CUT_EXTRUDE3_DEPTH, mode=Mode.SUBTRACT)

    # Sketch17 → Boss-Extrude8 (add)
    with BuildSketch(Plane.ZY.offset(-37.2745)):
        with Locations(Location((0, 48.593569324, 0), (0, 0, 180))):
            Circle(SKETCH17_R)
    boss_extrude8 = extrude(amount=BOSS_EXTRUDE8_DEPTH)

    # Sketch18 → Cut-Extrude4 (cut)
    with BuildSketch(Plane.ZY.offset(-26.035)):
        with Locations((0, 48.593569324)):
            Circle(SKETCH18_R)
    cut_extrude4 = extrude(amount=-CUT_EXTRUDE4_DEPTH, mode=Mode.SUBTRACT)

    # Mirror4: Cut-Extrude3, Boss-Extrude8, Cut-Extrude4 across plane
    add(cut_extrude3.mirror(Plane(origin=(0, 0, 0), x_dir=(0, 0, 1), z_dir=(1, 0, 0))), mode=Mode.SUBTRACT)
    add(boss_extrude8.mirror(Plane(origin=(0, 0, 0), x_dir=(0, 0, 1), z_dir=(1, 0, 0))))
    add(cut_extrude4.mirror(Plane(origin=(0, 0, 0), x_dir=(0, 0, 1), z_dir=(1, 0, 0))), mode=Mode.SUBTRACT)


solid = part.part
